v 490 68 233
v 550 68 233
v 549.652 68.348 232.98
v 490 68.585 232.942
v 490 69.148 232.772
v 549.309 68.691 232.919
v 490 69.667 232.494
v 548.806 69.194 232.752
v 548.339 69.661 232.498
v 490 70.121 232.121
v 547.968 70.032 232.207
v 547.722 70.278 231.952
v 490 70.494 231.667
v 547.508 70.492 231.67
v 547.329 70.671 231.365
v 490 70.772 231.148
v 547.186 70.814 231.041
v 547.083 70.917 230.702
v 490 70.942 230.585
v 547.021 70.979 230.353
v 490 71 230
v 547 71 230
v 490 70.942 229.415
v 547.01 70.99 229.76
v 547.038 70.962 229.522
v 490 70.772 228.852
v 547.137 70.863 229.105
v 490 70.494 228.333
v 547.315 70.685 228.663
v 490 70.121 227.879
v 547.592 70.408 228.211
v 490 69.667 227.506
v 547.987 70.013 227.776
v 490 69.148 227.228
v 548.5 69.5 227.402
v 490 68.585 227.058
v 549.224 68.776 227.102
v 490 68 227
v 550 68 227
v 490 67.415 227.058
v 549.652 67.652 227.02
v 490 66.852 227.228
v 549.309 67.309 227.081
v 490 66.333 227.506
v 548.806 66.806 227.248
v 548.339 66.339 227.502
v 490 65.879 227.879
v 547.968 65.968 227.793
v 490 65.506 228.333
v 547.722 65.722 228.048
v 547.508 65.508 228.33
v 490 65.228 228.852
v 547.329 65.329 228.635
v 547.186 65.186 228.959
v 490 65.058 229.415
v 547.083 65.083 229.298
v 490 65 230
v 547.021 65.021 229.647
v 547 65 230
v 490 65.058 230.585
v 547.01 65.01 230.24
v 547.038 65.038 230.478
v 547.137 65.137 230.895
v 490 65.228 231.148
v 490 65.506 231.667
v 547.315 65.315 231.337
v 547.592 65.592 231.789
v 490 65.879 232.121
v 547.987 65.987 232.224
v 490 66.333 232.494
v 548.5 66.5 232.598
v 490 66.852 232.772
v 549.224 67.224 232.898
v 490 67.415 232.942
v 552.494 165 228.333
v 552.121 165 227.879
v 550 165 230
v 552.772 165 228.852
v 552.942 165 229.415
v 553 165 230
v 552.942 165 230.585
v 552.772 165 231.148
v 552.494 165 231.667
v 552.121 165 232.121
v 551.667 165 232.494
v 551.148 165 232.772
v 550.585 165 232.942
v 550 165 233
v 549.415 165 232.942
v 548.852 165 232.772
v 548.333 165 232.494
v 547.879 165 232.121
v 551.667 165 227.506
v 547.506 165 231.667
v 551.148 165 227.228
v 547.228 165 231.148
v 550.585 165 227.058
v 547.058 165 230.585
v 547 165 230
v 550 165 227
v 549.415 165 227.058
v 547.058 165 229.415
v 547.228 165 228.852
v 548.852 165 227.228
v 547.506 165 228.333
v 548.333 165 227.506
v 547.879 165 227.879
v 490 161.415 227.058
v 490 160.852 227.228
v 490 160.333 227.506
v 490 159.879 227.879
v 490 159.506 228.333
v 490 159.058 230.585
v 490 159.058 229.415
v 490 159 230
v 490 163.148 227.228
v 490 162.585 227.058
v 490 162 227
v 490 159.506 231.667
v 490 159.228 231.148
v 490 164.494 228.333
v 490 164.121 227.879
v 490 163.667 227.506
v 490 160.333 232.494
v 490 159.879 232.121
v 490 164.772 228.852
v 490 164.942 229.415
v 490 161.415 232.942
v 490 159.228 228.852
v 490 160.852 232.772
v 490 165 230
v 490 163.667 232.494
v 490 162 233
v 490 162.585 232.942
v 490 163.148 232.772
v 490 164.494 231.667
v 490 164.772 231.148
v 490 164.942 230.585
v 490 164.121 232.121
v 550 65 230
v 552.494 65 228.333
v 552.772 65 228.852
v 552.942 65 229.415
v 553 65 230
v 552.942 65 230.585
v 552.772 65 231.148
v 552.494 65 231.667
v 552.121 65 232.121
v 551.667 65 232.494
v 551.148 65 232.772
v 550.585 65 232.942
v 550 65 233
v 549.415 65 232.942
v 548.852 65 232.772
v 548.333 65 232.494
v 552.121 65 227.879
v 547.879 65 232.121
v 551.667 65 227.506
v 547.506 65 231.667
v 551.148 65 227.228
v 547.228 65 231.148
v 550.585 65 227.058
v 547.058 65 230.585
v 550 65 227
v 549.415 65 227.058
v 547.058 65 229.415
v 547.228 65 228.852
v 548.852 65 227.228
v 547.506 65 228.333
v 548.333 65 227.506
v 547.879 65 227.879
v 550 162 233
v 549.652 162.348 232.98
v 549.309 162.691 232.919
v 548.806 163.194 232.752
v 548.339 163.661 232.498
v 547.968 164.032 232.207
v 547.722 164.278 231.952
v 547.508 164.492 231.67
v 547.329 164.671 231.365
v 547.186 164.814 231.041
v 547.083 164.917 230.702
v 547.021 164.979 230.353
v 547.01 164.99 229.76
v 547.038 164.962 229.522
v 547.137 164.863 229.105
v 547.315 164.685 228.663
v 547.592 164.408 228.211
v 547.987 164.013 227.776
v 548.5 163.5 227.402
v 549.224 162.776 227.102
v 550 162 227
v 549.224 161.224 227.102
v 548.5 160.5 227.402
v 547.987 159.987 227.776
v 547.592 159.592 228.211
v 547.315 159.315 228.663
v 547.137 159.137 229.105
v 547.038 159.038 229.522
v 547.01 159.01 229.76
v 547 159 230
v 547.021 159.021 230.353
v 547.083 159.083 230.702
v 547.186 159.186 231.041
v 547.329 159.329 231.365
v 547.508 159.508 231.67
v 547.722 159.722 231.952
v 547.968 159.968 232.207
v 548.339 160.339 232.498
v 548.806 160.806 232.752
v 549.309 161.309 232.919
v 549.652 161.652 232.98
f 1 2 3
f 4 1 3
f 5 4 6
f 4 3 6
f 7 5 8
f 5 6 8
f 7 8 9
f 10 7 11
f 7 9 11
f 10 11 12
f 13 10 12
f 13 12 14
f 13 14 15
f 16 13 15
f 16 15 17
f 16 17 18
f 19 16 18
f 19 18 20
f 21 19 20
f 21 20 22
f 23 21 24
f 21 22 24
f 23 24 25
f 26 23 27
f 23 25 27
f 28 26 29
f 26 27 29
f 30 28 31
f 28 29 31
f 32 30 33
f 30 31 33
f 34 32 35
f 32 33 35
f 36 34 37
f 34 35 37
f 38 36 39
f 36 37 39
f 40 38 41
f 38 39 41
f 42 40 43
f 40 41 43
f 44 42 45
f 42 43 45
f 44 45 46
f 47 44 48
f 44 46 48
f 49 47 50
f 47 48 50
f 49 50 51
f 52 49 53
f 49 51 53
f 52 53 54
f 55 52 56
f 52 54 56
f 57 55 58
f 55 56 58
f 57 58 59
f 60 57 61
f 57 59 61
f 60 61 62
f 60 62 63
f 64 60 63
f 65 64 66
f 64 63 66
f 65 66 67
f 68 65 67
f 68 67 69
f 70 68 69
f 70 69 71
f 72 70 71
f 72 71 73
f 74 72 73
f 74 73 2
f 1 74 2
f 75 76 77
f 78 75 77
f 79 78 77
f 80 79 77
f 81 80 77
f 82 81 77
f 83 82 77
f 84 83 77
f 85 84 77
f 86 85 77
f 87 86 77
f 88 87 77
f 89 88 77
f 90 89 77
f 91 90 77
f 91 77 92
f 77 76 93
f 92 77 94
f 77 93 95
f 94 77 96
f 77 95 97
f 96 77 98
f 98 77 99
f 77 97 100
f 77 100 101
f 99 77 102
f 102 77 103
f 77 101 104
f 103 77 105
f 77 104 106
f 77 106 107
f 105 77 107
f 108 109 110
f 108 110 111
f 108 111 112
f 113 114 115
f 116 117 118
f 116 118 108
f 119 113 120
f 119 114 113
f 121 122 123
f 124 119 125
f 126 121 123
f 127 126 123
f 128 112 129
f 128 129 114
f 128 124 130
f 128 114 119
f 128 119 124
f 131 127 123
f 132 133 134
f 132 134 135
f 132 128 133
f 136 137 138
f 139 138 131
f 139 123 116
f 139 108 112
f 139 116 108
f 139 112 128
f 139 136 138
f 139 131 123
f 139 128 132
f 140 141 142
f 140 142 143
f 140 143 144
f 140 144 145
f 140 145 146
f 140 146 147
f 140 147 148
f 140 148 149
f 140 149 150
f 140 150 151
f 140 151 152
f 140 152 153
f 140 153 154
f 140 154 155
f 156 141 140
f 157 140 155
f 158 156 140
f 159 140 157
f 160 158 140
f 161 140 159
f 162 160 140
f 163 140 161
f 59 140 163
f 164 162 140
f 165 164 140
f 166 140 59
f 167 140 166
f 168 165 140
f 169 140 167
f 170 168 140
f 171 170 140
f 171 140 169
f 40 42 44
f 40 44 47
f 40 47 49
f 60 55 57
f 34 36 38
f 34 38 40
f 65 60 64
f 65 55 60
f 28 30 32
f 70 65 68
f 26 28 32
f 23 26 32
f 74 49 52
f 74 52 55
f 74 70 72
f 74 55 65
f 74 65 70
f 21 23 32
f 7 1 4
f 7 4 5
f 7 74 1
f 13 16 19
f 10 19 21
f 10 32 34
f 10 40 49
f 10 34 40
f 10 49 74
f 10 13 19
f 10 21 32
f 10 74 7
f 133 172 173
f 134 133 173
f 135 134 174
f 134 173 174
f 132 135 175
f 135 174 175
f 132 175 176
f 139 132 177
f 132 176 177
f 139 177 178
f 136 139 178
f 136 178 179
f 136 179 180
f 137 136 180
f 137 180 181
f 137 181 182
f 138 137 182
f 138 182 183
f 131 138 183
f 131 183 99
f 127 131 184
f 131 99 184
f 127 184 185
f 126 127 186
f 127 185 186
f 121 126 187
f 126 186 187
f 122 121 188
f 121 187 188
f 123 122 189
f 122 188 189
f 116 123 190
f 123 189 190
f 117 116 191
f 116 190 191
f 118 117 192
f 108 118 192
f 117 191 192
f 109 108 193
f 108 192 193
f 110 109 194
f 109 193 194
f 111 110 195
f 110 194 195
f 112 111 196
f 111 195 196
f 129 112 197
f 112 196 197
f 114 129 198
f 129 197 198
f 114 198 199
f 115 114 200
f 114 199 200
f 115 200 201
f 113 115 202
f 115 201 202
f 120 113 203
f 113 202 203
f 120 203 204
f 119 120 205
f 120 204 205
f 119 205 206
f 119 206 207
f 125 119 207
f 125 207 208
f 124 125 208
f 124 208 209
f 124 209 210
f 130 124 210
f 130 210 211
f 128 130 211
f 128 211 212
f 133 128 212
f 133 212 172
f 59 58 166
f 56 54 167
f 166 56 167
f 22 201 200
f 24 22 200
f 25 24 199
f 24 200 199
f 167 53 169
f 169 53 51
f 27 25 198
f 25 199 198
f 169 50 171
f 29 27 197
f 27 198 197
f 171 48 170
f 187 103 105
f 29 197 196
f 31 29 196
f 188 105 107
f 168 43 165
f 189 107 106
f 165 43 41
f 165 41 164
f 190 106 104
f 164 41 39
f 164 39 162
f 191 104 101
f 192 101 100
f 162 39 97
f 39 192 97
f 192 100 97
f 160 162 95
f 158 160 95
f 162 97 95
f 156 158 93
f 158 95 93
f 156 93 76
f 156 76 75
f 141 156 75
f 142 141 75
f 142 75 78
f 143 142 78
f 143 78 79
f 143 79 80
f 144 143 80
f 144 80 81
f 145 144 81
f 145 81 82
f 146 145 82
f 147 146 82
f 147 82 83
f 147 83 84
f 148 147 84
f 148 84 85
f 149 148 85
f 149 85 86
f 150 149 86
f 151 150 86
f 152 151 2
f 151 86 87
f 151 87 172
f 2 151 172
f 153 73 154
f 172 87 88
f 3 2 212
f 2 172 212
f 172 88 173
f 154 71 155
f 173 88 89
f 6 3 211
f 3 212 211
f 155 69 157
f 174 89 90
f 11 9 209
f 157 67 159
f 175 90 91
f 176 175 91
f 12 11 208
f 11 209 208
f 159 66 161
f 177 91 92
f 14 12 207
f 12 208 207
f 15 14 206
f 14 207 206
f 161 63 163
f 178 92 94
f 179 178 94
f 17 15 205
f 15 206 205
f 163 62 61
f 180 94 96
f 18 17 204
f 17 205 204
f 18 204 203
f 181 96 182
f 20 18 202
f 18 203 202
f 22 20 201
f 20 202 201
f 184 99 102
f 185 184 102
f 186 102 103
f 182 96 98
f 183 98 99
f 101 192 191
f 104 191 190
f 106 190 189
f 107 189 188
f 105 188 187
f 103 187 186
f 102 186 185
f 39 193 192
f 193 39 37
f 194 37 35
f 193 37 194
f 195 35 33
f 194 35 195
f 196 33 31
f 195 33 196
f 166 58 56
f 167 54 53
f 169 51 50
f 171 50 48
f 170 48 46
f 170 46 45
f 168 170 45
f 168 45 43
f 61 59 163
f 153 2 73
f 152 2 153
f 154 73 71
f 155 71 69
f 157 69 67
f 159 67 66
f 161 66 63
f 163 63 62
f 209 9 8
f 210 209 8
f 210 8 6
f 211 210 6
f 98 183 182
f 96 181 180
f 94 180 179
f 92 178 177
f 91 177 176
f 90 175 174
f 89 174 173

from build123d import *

# Parameters (mm, degrees)
CYLINDER023_R             = 3
CYLINDER023_DEPTH         = 60
CYLINDER023_PITCH_ANGLE   = 90
CYLINDER022_R             = 3
CYLINDER022_DEPTH         = 100
CYLINDER022_ROLL_ANGLE    = 90
CYLINDER024_R             = 3
CYLINDER024_DEPTH         = 60
CYLINDER024_PITCH_ANGLE   = 90
FUSION009_PLACEMENT_ANGLE = 180


with BuildPart() as cylinder029:
    # Cylinder023 → Cylinder023 (new body)
    with BuildSketch(Plane.XY):
        Circle(CYLINDER023_R)
    extrude(amount=CYLINDER023_DEPTH)


with BuildPart() as cylinder029_1:
    # Cylinder023 pitch: moved
    add(cylinder029.part.rotate(Axis((0, 0, 0), (0, 1, 0)), CYLINDER023_PITCH_ANGLE))


with BuildPart() as cylinder029_2:
    # Cylinder023 placement: moved
    add(cylinder029_1.part.moved(Location((-50, -3, 0))))


with BuildPart() as fusion008:
    # Cylinder022 → Cylinder022 (new body)
    with BuildSketch(Plane.XY):
        Circle(CYLINDER022_R)
    extrude(amount=CYLINDER022_DEPTH)


with BuildPart() as fusion008_1:
    # Cylinder022 roll: moved
    add(fusion008.part.rotate(Axis((0, 0, 0), (1, 0, 0)), CYLINDER022_ROLL_ANGLE))


with BuildPart() as fusion008_2:
    # Cylinder022 placement: moved
    add(fusion008_1.part.moved(Location((-50, 0, 0))))

    # Fusion008: union Cylinder029
    add(cylinder029_2.part)


with BuildPart() as handle_right:
    # Cylinder024 → Cylinder024 (new body)
    with BuildSketch(Plane.XY):
        Circle(CYLINDER024_R)
    extrude(amount=CYLINDER024_DEPTH)


with BuildPart() as handle_right_1:
    # Cylinder024 pitch: moved
    add(handle_right.part.rotate(Axis((0, 0, 0), (0, 1, 0)), CYLINDER024_PITCH_ANGLE))


with BuildPart() as handle_right_2:
    # Cylinder024 placement: moved
    add(handle_right_1.part.moved(Location((-50, -97, 0))))

    # Fusion009: union Fusion008
    add(fusion008_2.part)


with BuildPart() as handle_right_3:
    # Fusion009 placement: moved
    add(handle_right_2.part.moved(Location((500, 165, 230))).rotate(Axis((500, 165, 230), (0, 1, 0)), FUSION009_PLACEMENT_ANGLE))


solid = handle_right_3.part
